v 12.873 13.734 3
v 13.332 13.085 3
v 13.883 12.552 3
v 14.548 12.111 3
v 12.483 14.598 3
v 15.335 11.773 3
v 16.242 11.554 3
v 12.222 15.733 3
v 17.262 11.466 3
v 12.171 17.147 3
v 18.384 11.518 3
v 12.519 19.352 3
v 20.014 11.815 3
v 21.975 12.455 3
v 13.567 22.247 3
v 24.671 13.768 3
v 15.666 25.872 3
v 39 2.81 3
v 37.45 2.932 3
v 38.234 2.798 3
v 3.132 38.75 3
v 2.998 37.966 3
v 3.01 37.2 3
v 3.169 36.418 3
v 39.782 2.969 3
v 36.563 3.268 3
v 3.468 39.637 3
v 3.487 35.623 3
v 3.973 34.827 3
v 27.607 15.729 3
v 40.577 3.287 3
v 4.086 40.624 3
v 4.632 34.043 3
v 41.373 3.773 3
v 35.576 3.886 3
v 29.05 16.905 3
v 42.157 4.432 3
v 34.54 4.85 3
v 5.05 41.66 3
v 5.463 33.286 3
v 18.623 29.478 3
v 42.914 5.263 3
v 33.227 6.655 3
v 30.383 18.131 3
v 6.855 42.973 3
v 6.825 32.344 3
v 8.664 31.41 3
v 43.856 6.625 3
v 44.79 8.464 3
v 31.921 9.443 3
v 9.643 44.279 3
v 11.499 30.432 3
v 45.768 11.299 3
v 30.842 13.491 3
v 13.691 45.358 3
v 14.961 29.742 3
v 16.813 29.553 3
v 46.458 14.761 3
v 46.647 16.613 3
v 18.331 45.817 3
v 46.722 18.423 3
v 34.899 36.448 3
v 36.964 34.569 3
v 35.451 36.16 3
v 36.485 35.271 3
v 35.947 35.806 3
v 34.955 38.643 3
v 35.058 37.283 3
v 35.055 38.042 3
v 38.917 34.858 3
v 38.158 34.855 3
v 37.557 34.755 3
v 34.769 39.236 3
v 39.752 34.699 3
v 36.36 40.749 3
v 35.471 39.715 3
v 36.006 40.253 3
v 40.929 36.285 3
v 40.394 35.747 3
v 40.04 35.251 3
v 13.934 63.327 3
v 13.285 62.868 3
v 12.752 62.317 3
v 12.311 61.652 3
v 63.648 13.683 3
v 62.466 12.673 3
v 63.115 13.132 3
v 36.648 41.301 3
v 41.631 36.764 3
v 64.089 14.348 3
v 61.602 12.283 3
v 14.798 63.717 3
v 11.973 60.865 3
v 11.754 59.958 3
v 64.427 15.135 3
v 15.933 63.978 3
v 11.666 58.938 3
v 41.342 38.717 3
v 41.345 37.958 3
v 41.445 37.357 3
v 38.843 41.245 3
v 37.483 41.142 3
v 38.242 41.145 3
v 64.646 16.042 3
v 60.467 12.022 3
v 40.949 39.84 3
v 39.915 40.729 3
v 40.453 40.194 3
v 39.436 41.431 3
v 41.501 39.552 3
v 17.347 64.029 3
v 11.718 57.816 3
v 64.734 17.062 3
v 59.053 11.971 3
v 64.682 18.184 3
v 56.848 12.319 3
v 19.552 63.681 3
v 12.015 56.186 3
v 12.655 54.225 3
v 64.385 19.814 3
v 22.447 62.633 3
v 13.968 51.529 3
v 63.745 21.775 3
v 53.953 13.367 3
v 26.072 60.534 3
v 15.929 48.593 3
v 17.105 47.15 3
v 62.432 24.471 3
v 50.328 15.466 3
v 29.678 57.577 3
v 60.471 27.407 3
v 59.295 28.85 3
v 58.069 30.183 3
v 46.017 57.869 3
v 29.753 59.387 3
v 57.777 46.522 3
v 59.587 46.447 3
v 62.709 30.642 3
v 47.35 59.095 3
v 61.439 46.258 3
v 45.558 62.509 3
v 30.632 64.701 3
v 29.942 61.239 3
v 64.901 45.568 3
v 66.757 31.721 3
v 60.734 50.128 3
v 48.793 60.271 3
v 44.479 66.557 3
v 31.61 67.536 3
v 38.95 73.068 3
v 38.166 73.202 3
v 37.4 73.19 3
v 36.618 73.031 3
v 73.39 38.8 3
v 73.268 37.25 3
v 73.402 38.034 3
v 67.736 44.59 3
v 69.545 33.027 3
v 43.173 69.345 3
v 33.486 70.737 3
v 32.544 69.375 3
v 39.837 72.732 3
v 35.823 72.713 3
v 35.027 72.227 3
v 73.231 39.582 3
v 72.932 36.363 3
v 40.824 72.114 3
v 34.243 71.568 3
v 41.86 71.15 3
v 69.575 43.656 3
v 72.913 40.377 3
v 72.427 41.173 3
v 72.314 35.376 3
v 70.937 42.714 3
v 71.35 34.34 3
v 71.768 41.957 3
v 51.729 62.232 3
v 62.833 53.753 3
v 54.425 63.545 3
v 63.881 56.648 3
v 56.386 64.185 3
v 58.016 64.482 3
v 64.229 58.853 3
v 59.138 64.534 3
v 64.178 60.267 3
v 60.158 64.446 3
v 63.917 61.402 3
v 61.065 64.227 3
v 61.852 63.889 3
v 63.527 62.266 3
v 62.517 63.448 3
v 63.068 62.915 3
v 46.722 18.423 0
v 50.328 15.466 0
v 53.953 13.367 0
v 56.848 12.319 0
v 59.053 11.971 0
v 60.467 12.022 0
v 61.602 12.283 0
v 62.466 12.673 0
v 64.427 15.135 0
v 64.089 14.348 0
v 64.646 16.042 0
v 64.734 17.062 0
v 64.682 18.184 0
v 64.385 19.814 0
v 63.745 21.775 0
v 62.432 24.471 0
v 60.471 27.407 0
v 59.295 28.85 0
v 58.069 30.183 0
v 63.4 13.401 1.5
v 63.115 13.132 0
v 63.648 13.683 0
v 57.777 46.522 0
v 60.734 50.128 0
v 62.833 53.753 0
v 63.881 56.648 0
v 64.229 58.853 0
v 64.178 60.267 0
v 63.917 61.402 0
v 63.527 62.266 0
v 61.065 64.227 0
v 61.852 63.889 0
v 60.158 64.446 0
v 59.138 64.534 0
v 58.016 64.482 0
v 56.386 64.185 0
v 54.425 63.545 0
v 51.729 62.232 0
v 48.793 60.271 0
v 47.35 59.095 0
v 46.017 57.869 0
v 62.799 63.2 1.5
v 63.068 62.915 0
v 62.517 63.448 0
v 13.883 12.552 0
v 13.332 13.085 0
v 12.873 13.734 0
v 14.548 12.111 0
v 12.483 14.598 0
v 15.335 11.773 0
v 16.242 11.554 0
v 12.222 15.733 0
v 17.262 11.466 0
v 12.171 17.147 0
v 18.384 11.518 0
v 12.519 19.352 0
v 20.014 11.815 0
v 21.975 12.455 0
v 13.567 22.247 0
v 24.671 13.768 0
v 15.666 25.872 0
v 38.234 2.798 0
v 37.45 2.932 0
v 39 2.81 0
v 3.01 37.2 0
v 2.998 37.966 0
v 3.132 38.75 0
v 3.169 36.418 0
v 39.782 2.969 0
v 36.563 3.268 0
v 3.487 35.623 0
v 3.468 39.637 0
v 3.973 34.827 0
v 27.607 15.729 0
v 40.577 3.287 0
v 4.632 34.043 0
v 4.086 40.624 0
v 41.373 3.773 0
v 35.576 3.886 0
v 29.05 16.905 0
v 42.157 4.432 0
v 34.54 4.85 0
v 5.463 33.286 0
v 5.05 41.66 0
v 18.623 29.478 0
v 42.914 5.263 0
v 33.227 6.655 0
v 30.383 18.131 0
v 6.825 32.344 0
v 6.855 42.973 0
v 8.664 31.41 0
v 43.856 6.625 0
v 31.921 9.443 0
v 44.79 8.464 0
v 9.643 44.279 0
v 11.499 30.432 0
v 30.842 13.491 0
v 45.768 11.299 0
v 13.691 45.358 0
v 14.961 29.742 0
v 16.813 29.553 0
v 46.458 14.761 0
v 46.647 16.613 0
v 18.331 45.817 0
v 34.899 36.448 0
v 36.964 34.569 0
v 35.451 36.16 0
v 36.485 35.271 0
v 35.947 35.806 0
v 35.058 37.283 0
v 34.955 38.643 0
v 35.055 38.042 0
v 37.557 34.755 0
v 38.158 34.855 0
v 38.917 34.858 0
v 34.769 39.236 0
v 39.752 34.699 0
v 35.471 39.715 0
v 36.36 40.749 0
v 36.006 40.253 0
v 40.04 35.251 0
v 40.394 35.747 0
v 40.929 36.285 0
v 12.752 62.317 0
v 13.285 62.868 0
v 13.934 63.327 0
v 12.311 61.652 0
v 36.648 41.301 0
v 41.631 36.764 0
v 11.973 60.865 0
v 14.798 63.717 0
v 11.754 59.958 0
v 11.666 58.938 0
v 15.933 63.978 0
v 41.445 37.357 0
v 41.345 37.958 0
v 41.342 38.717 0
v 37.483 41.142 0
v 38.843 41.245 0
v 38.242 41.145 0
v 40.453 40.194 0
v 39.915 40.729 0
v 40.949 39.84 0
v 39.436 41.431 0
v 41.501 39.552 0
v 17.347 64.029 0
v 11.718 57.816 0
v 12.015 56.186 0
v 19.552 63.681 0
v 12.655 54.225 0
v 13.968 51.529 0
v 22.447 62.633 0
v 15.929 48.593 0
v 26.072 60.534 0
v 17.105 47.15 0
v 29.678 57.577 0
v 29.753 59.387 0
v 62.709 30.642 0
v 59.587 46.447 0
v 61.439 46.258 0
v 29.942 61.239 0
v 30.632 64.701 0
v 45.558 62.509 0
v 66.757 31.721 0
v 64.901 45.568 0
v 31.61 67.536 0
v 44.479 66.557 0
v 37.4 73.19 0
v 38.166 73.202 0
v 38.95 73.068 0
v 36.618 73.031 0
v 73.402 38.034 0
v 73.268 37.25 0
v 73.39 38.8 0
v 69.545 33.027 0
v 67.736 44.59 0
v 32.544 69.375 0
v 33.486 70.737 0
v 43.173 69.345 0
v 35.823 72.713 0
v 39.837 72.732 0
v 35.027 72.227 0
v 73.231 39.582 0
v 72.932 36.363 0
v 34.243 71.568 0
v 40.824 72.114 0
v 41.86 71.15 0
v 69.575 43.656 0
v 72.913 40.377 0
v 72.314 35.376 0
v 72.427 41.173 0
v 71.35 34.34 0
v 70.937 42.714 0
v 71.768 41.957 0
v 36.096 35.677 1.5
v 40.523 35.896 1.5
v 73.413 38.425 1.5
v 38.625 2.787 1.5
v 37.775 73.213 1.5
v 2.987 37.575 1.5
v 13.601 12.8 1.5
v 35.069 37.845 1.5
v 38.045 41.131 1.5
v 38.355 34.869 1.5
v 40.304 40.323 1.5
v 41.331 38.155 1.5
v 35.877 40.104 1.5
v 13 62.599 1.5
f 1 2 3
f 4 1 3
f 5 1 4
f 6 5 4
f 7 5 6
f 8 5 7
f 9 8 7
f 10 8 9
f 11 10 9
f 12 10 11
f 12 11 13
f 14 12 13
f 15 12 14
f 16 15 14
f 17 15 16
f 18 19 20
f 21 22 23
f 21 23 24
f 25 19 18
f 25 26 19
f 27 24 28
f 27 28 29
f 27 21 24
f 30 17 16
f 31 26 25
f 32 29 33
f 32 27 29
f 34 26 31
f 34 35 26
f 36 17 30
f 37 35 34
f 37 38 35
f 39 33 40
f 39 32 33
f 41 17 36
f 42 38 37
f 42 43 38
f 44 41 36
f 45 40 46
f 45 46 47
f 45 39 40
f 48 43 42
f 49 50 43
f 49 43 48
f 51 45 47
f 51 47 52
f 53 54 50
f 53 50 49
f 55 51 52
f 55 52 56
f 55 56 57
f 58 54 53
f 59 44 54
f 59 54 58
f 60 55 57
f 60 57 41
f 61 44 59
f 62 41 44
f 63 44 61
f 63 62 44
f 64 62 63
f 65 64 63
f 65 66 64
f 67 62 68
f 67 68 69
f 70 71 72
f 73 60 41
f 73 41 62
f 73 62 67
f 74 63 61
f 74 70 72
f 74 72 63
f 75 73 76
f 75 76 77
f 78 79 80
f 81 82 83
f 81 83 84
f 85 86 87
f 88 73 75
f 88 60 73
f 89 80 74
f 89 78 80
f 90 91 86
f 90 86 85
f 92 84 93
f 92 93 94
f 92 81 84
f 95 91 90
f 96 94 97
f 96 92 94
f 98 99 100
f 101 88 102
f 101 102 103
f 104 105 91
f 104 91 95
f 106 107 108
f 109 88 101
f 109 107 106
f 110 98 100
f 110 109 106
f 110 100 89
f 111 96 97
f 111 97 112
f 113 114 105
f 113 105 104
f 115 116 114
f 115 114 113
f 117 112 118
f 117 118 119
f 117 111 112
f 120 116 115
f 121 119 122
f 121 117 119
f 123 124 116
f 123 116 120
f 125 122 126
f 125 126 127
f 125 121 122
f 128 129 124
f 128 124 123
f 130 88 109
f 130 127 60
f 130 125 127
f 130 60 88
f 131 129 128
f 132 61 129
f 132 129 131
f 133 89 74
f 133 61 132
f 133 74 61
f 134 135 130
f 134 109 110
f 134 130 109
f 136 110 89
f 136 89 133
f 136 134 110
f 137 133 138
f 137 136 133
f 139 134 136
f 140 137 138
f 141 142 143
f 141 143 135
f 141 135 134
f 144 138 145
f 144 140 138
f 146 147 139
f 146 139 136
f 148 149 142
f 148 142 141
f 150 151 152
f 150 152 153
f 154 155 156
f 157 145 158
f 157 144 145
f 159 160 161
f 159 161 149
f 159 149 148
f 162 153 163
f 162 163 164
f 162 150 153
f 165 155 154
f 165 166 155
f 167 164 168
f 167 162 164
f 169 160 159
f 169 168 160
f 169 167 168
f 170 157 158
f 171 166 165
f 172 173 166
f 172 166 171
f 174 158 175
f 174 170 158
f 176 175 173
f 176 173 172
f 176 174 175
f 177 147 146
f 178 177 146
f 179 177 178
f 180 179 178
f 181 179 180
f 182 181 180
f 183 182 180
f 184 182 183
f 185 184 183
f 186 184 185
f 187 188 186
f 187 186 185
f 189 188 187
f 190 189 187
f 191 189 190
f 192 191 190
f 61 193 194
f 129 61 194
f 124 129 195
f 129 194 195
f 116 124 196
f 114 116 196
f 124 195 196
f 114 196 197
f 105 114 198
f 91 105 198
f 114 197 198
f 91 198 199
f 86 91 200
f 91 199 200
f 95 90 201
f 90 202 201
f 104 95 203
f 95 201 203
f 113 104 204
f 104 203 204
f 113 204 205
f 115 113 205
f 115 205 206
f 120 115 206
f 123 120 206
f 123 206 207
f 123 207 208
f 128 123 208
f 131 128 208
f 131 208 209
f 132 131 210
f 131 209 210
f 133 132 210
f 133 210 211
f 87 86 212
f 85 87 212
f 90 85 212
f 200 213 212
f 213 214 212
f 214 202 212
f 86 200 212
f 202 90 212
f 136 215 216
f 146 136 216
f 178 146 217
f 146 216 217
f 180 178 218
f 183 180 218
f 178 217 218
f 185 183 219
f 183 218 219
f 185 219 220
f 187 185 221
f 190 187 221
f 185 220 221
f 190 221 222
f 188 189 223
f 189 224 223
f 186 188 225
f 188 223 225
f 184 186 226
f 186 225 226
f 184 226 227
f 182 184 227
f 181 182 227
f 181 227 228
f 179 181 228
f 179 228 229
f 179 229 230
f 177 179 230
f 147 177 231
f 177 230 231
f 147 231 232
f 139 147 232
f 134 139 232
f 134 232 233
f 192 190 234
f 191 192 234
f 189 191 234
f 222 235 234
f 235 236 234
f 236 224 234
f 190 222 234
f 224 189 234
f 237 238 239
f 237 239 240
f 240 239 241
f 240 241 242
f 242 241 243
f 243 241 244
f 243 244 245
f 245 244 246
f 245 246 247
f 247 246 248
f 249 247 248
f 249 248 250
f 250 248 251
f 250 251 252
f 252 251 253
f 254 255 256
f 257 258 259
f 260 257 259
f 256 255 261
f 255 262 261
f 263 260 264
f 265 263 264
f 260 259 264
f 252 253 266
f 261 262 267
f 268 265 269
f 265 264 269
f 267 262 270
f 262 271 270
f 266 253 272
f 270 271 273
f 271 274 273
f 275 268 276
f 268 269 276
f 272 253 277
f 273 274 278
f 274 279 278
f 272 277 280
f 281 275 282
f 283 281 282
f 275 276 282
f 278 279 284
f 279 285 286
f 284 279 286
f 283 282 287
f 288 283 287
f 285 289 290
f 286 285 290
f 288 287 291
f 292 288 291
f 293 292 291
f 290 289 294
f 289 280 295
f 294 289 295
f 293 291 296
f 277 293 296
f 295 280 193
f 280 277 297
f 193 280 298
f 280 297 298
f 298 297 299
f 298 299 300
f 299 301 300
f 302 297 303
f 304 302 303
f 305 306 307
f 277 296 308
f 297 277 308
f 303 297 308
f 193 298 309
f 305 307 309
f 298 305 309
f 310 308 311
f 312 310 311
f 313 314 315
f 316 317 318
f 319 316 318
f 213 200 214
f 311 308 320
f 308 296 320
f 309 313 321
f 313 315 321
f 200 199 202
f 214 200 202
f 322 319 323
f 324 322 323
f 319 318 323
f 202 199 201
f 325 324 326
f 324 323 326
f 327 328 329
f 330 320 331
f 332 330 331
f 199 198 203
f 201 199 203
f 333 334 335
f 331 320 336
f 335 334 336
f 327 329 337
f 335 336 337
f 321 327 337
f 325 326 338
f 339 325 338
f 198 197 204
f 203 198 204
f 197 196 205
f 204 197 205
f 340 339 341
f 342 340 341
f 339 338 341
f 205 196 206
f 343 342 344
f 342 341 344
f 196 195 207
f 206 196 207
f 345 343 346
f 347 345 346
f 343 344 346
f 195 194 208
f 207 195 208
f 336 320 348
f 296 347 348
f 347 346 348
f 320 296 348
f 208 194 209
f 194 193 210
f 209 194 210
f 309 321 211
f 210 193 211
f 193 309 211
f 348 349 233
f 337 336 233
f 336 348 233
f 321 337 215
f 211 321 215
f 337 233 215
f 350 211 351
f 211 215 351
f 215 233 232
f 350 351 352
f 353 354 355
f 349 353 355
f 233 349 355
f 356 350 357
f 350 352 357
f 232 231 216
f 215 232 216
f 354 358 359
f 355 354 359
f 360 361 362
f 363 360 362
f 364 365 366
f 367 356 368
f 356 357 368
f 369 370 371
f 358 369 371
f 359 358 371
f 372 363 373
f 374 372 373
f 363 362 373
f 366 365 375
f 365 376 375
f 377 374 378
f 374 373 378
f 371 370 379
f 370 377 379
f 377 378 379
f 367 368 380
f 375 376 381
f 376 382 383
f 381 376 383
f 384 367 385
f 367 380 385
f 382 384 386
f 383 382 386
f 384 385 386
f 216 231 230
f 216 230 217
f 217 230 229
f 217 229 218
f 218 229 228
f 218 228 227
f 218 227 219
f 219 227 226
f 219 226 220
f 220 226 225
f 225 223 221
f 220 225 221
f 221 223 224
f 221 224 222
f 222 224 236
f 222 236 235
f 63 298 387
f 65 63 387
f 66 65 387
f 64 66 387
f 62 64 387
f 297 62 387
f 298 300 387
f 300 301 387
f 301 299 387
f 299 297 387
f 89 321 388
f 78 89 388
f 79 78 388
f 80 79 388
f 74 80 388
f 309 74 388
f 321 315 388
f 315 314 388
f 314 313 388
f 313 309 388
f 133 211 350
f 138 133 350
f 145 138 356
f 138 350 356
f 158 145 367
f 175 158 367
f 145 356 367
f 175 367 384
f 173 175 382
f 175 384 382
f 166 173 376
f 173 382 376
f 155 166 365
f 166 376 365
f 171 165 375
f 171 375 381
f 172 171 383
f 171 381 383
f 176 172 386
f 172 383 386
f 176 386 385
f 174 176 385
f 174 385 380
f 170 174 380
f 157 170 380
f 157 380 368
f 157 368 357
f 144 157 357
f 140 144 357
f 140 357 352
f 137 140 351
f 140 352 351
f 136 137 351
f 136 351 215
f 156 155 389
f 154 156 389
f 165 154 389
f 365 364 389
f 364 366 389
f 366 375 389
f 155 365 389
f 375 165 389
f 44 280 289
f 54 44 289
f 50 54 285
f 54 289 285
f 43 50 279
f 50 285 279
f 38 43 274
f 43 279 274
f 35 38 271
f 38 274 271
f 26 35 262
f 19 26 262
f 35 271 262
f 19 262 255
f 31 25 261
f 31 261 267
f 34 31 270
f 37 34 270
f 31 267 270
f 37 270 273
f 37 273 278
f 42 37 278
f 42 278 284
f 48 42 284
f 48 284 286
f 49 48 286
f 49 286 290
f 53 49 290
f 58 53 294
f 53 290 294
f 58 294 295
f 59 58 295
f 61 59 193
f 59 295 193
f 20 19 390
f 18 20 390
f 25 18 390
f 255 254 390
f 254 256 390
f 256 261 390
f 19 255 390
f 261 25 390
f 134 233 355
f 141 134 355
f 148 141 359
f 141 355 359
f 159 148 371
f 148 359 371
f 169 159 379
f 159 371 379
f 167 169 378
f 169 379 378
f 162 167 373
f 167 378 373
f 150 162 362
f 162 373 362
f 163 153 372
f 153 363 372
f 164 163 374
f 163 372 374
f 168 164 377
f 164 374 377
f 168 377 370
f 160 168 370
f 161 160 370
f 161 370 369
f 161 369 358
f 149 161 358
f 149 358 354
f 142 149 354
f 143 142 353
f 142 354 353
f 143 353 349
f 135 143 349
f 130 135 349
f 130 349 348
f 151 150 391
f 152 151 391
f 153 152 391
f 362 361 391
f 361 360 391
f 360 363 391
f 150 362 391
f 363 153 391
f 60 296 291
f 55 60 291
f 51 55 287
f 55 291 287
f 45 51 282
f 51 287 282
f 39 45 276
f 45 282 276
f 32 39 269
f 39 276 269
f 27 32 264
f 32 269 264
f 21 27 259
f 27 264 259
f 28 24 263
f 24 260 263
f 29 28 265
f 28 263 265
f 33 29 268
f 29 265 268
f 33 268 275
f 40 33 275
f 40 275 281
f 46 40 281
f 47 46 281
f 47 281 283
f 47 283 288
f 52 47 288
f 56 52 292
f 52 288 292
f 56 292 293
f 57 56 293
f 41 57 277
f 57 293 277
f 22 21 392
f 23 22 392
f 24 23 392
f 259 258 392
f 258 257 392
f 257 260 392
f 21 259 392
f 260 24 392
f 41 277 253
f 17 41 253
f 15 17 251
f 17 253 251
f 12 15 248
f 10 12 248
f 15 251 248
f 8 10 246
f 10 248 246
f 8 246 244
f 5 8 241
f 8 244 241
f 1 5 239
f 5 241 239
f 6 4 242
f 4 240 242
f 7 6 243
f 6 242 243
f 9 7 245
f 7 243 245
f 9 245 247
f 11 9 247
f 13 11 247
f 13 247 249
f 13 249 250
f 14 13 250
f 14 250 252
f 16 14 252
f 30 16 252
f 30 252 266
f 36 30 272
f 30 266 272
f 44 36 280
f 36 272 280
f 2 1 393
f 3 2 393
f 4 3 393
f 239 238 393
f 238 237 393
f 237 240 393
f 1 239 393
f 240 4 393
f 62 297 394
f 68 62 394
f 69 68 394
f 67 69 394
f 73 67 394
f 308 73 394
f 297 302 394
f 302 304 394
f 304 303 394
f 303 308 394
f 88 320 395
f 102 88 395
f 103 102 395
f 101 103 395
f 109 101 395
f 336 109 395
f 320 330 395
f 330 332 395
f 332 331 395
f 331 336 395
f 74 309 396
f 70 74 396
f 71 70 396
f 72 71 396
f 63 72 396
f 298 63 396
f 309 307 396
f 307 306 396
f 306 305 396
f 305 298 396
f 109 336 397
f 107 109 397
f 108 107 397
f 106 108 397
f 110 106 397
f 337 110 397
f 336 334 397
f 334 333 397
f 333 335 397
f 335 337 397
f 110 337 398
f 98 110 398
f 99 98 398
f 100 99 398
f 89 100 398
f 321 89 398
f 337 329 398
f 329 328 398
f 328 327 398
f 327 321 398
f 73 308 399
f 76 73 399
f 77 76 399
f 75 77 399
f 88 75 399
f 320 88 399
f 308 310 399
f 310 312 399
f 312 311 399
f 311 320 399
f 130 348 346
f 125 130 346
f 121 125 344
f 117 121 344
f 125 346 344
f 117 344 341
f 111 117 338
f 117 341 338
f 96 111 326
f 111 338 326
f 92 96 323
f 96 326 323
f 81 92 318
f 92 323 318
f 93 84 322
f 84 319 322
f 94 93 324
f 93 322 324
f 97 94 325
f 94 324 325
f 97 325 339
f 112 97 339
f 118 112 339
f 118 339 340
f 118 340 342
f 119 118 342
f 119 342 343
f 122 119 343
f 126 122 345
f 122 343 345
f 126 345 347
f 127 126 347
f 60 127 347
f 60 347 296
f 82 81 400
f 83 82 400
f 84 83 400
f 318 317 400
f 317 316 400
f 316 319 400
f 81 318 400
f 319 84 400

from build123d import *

# Parameters (mm, degrees)
F3_DEPTH = 3


with BuildPart() as f3:
    # F2 (on face) → F3 (new body)
    with BuildSketch(Plane.XY):
        with BuildLine():
            add(Edge.make_bspline(
                [(46.0166394773, 57.8690613342), (45.6725287761, 73.3543999887), (37.7751981504, 73.2131118908), (29.8778675246, 73.0718237928), (29.6776507752, 57.5767467858)],
                knots=[4.755974008, 4.755974008, 4.755974008, 6.2923007601, 6.2923007601, 7.8286275121, 7.8286275121, 7.8286275121], degree=2, weights=[1, 0.7191879967, 1, 0.7191879967, 1]))
            add(Edge.make_bspline(
                [(29.6776507752, 57.5767467858), (18.4845397934, 68.283211747), (13.0001895268, 62.5990499361), (7.5158392602, 56.9148881252), (18.3309386658, 45.8166394773)],
                knots=[4.755974008, 4.755974008, 4.755974008, 6.2923007601, 6.2923007601, 7.8286275121, 7.8286275121, 7.8286275121], degree=2, weights=[1, 0.7191879967, 1, 0.7191879967, 1]))
            add(Edge.make_bspline(
                [(18.3309386658, 45.8166394773), (2.8456000113, 45.4725287761), (2.9868881092, 37.5751981504), (3.1281762072, 29.6778675246), (18.6232532142, 29.4776507752)],
                knots=[4.755974008, 4.755974008, 4.755974008, 6.2923007601, 6.2923007601, 7.8286275121, 7.8286275121, 7.8286275121], degree=2, weights=[1, 0.7191879967, 1, 0.7191879967, 1]))
            add(Edge.make_bspline(
                [(18.6232532142, 29.4776507752), (7.916788253, 18.2845397934), (13.6009500639, 12.8001895268), (19.2851118748, 7.3158392602), (30.3833605227, 18.1309386658)],
                knots=[4.755974008, 4.755974008, 4.755974008, 6.2923007601, 6.2923007601, 7.8286275121, 7.8286275121, 7.8286275121], degree=2, weights=[1, 0.7191879967, 1, 0.7191879967, 1]))
            add(Edge.make_bspline(
                [(30.3833605227, 18.1309386658), (30.7274712239, 2.6456000113), (38.6248018496, 2.7868881092), (46.5221324754, 2.9281762072), (46.7223492248, 18.4232532142)],
                knots=[4.755974008, 4.755974008, 4.755974008, 6.2923007601, 6.2923007601, 7.8286275121, 7.8286275121, 7.8286275121], degree=2, weights=[1, 0.7191879967, 1, 0.7191879967, 1]))
            add(Edge.make_bspline(
                [(46.7223492248, 18.4232532142), (57.9154602066, 7.716788253), (63.3998104732, 13.4009500639), (68.8841607398, 19.0851118748), (58.0690613342, 30.1833605227)],
                knots=[4.755974008, 4.755974008, 4.755974008, 6.2923007601, 6.2923007601, 7.8286275121, 7.8286275121, 7.8286275121], degree=2, weights=[1, 0.7191879967, 1, 0.7191879967, 1]))
            add(Edge.make_bspline(
                [(58.0690613342, 30.1833605227), (73.5543999887, 30.5274712239), (73.4131118908, 38.4248018496), (73.2718237928, 46.3221324754), (57.7767467858, 46.5223492248)],
                knots=[4.755974008, 4.755974008, 4.755974008, 6.2923007601, 6.2923007601, 7.8286275121, 7.8286275121, 7.8286275121], degree=2, weights=[1, 0.7191879967, 1, 0.7191879967, 1]))
            add(Edge.make_bspline(
                [(57.7767467858, 46.5223492248), (68.483211747, 57.7154602066), (62.7990499361, 63.1998104732), (57.1148881252, 68.6841607398), (46.0166394773, 57.8690613342)],
                knots=[4.755974008, 4.755974008, 4.755974008, 6.2923007601, 6.2923007601, 7.8286275121, 7.8286275121, 7.8286275121], degree=2, weights=[1, 0.7191879967, 1, 0.7191879967, 1]))
        make_face()
        with BuildLine():
            add(Edge.make_bspline(
                [(34.7686447028, 39.2363682043), (36.0473640482, 39.9375446788), (36.647909742, 41.3005789406)],
                knots=[2.9940426833, 2.9940426833, 2.9940426833, 3.3369260654, 3.3369260654, 3.3369260654], degree=2, weights=[1, 0.9853398341, 1]))
            add(Edge.make_bspline(
                [(36.647909742, 41.3005789406), (38.0479075023, 40.8921944601), (39.4363682043, 41.4313552972)],
                knots=[2.9940426833, 2.9940426833, 2.9940426833, 3.3369260654, 3.3369260654, 3.3369260654], degree=2, weights=[1, 0.9853398341, 1]))
            add(Edge.make_bspline(
                [(39.4363682043, 41.4313552972), (40.1375446788, 40.1526359518), (41.5005789406, 39.552090258)],
                knots=[2.9940426833, 2.9940426833, 2.9940426833, 3.3369260654, 3.3369260654, 3.3369260654], degree=2, weights=[1, 0.9853398341, 1]))
            add(Edge.make_bspline(
                [(41.5005789406, 39.552090258), (41.0921944601, 38.1520924977), (41.6313552972, 36.7636317957)],
                knots=[2.9940426833, 2.9940426833, 2.9940426833, 3.3369260654, 3.3369260654, 3.3369260654], degree=2, weights=[1, 0.9853398341, 1]))
            add(Edge.make_bspline(
                [(41.6313552972, 36.7636317957), (40.3526359518, 36.0624553212), (39.752090258, 34.6994210594)],
                knots=[2.9940426833, 2.9940426833, 2.9940426833, 3.3369260654, 3.3369260654, 3.3369260654], degree=2, weights=[1, 0.9853398341, 1]))
            add(Edge.make_bspline(
                [(39.752090258, 34.6994210594), (38.3520924977, 35.1078055399), (36.9636317957, 34.5686447028)],
                knots=[2.9940426833, 2.9940426833, 2.9940426833, 3.3369260654, 3.3369260654, 3.3369260654], degree=2, weights=[1, 0.9853398341, 1]))
            add(Edge.make_bspline(
                [(36.9636317957, 34.5686447028), (36.2624553212, 35.8473640482), (34.8994210594, 36.447909742)],
                knots=[2.9940426833, 2.9940426833, 2.9940426833, 3.3369260654, 3.3369260654, 3.3369260654], degree=2, weights=[1, 0.9853398341, 1]))
            add(Edge.make_bspline(
                [(34.8994210594, 36.447909742), (35.3078055399, 37.8479075023), (34.7686447028, 39.2363682043)],
                knots=[2.9940426833, 2.9940426833, 2.9940426833, 3.3369260654, 3.3369260654, 3.3369260654], degree=2, weights=[1, 0.9853398341, 1]))
        make_face(mode=Mode.SUBTRACT)
    extrude(amount=F3_DEPTH)


solid = f3.part
